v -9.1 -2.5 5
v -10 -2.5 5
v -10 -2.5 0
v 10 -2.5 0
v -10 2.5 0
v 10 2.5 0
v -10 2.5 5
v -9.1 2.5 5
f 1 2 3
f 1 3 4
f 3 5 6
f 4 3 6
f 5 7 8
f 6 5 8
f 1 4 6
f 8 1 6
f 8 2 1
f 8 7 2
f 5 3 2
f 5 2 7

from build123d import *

# Parameters (mm, degrees)
F0_W     = 20
F0_H     = 5
F1_DEPTH = 5
F2_SIZE2 = 4.99999
F2_SIZE  = 19.09999


# Not quite as in the source:
# - a fillet or chamfer is up to 0.001 mm smaller than in the source, because OpenCascade refuses the exact size


with BuildPart() as f1:
    # F0 (on Top) → F1 (new body)
    with BuildSketch(Plane.XY):
        Rectangle(F0_W, F0_H)
    extrude(amount=F1_DEPTH)

    # F2 (size 19.1 and 5 in the source; OpenCascade refuses exactly that, so slightly less here)
    f2_edges = [f1.edges().sort_by_distance(p)[0] for p in [
        (10, 0, 5),
    ]]
    f2_side = f1.faces().sort_by_distance((0, 0, 5))[0]
    chamfer(f2_edges, length=F2_SIZE, length2=F2_SIZE2, reference=f2_side)


solid = f1.part
